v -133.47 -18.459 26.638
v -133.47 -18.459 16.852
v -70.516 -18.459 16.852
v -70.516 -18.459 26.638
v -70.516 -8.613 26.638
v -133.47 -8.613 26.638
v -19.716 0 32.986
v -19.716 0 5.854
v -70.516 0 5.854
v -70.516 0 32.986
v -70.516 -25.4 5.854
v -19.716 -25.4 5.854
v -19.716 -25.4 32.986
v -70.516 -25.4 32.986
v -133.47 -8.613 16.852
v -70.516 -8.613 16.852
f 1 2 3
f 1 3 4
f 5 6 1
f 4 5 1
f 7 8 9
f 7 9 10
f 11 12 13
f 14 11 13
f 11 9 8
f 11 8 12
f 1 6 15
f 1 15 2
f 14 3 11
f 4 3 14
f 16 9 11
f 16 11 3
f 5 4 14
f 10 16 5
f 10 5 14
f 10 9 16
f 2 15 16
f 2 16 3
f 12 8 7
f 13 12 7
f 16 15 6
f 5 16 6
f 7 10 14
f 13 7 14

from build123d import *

# Parameters (mm, degrees)
F0_W     = 50.8
F0_H     = 27.1318203053
F1_DEPTH = 25.4
F2_DEPTH = 25.4
F4_W     = 9.8461210728
F4_H     = 9.7858998924
F5_DEPTH = 62.9539089


# Not quite as in the source:
# - an extrude ends at something that could not be found from the text; its depth is read off the source's solid


with BuildPart() as f1:
    # F0 (on Front) → F1 (new body)
    with BuildSketch(Plane.XZ):
        with Locations((-45.1160669327, 19.4199038669)):
            Rectangle(F0_W, F0_H)
    extrude(amount=F1_DEPTH)

    # F2 (add): a face of the model
    f2_faces = [f1.faces().sort_by_distance(p)[0] for p in [
        (-70.5160669327, -12.7, 19.4199038669),
    ]]
    extrude(f2_faces, amount=-F2_DEPTH)

    # F4 (on face) → F5 (join, through all)
    with BuildSketch(Plane(origin=(-70.5160669327, 0, 0), x_dir=(0, -1, 0), z_dir=(-1, 0, 0))):
        with Locations((13.5363917798, 21.7452598736)):
            Rectangle(F4_W, F4_H)
    extrude(amount=F5_DEPTH)


solid = f1.part
